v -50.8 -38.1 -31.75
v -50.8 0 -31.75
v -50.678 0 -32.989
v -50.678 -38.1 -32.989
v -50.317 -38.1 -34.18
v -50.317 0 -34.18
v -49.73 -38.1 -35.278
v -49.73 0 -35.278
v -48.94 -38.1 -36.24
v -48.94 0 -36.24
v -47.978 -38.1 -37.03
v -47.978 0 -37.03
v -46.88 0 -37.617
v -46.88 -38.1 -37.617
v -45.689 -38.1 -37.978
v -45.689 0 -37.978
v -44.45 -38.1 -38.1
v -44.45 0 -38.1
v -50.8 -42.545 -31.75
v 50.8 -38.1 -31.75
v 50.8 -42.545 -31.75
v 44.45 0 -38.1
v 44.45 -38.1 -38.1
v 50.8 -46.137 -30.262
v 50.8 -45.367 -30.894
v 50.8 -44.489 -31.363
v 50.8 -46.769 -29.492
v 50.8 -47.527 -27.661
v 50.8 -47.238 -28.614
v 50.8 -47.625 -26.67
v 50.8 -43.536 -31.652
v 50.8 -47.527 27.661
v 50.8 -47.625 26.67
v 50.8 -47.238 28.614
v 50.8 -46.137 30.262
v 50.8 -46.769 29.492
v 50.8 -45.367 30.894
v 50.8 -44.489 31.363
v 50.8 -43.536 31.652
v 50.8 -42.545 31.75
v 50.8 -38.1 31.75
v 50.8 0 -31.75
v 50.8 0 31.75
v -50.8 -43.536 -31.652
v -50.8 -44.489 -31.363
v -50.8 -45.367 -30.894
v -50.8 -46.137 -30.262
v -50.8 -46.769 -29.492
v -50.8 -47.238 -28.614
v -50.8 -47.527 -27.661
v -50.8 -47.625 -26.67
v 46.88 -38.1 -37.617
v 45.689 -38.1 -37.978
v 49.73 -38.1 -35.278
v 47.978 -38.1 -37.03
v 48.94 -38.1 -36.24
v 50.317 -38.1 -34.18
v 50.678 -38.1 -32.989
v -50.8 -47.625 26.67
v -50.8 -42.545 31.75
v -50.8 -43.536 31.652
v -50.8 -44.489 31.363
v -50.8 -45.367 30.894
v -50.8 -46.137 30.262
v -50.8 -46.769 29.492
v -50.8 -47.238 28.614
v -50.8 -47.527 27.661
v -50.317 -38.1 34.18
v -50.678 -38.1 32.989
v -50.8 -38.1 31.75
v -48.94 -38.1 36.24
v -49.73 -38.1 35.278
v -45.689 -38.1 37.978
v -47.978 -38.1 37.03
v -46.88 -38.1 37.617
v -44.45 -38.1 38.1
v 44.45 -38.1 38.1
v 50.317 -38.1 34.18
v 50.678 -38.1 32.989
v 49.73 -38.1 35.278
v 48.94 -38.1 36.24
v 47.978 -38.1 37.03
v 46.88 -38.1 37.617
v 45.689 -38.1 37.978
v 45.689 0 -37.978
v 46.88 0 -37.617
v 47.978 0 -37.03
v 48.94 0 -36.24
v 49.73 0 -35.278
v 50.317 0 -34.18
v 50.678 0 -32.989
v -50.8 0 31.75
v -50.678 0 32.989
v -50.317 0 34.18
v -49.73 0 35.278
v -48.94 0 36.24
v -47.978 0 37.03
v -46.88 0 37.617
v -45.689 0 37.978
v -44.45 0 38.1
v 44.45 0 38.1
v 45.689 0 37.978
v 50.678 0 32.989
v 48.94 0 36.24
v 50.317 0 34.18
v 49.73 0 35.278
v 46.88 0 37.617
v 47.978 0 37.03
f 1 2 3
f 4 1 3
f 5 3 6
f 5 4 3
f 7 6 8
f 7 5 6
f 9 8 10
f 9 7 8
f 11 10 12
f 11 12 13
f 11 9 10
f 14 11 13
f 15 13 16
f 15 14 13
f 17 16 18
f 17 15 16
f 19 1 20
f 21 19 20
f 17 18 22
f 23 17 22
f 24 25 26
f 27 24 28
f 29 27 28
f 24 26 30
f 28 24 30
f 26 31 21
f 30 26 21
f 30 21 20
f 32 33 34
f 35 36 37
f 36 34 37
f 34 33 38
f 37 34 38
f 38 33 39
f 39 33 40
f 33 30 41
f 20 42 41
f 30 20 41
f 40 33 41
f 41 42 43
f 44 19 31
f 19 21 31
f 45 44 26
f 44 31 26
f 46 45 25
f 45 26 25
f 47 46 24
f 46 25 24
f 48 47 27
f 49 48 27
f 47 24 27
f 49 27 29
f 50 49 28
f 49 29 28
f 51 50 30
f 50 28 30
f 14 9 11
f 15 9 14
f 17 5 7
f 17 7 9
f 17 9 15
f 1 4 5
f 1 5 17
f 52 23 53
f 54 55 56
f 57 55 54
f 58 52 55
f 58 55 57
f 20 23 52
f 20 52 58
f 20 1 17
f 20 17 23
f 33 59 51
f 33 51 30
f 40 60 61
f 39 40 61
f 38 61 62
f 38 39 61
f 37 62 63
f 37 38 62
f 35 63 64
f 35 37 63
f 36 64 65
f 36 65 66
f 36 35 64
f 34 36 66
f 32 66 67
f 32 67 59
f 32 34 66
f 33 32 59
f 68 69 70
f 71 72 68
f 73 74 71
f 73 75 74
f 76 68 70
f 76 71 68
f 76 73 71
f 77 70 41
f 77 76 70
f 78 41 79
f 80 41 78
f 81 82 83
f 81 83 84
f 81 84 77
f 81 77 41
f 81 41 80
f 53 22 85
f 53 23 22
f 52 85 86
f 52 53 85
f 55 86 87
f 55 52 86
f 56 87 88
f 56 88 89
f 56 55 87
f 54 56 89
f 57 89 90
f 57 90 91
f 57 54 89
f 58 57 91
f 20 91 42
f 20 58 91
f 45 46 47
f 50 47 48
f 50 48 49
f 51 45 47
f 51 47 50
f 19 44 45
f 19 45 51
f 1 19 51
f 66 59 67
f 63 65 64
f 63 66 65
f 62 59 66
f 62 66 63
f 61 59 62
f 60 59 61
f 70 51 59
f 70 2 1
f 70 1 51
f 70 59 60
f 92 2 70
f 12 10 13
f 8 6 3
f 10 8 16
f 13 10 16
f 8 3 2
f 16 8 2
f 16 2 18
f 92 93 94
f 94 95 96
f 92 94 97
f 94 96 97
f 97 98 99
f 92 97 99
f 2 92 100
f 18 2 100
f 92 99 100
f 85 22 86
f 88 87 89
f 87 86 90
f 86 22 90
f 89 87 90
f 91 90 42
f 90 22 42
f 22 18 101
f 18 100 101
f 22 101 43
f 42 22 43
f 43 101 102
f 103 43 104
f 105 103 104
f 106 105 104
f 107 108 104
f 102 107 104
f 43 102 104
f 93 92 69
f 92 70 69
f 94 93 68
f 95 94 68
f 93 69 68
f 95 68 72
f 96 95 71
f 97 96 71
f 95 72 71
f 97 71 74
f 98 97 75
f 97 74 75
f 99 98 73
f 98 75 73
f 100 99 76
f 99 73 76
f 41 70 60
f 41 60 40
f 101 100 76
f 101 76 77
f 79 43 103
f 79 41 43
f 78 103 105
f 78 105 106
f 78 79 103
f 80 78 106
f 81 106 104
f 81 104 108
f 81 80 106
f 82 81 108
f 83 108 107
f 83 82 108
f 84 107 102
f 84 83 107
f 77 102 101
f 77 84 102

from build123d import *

# Parameters (mm, degrees)
F0_W     = 101.6
F0_H     = 76.2
F1_DEPTH = 38.1
F2_R     = 6.35
F3_W     = 101.6
F3_H     = 63.5
F4_DEPTH = 9.525
F5_R     = 5.08


with BuildPart() as f1:
    # F0 (on Front) → F1 (new body)
    with BuildSketch(Plane.XZ):
        Rectangle(F0_W, F0_H)
    extrude(amount=F1_DEPTH)

    # F2
    f2_edges = [f1.edges().sort_by_distance(p)[0] for p in [
        (50.8, -19.05, -38.1),
        (50.8, -19.05, 38.1),
        (-50.8, -19.05, 38.1),
        (-50.8, -19.05, -38.1),
    ]]
    fillet(f2_edges, radius=F2_R)

    # F3 (on face) → F4 (join)
    with BuildSketch(Plane.XZ.offset(38.1)):
        Rectangle(F3_W, F3_H)
    extrude(amount=F4_DEPTH)

    # F5
    f5_edges = [f1.edges().sort_by_distance(p)[0] for p in [
        (0, -47.625, 31.75),
        (0, -47.625, -31.75),
    ]]
    fillet(f5_edges, radius=F5_R)


solid = f1.part
